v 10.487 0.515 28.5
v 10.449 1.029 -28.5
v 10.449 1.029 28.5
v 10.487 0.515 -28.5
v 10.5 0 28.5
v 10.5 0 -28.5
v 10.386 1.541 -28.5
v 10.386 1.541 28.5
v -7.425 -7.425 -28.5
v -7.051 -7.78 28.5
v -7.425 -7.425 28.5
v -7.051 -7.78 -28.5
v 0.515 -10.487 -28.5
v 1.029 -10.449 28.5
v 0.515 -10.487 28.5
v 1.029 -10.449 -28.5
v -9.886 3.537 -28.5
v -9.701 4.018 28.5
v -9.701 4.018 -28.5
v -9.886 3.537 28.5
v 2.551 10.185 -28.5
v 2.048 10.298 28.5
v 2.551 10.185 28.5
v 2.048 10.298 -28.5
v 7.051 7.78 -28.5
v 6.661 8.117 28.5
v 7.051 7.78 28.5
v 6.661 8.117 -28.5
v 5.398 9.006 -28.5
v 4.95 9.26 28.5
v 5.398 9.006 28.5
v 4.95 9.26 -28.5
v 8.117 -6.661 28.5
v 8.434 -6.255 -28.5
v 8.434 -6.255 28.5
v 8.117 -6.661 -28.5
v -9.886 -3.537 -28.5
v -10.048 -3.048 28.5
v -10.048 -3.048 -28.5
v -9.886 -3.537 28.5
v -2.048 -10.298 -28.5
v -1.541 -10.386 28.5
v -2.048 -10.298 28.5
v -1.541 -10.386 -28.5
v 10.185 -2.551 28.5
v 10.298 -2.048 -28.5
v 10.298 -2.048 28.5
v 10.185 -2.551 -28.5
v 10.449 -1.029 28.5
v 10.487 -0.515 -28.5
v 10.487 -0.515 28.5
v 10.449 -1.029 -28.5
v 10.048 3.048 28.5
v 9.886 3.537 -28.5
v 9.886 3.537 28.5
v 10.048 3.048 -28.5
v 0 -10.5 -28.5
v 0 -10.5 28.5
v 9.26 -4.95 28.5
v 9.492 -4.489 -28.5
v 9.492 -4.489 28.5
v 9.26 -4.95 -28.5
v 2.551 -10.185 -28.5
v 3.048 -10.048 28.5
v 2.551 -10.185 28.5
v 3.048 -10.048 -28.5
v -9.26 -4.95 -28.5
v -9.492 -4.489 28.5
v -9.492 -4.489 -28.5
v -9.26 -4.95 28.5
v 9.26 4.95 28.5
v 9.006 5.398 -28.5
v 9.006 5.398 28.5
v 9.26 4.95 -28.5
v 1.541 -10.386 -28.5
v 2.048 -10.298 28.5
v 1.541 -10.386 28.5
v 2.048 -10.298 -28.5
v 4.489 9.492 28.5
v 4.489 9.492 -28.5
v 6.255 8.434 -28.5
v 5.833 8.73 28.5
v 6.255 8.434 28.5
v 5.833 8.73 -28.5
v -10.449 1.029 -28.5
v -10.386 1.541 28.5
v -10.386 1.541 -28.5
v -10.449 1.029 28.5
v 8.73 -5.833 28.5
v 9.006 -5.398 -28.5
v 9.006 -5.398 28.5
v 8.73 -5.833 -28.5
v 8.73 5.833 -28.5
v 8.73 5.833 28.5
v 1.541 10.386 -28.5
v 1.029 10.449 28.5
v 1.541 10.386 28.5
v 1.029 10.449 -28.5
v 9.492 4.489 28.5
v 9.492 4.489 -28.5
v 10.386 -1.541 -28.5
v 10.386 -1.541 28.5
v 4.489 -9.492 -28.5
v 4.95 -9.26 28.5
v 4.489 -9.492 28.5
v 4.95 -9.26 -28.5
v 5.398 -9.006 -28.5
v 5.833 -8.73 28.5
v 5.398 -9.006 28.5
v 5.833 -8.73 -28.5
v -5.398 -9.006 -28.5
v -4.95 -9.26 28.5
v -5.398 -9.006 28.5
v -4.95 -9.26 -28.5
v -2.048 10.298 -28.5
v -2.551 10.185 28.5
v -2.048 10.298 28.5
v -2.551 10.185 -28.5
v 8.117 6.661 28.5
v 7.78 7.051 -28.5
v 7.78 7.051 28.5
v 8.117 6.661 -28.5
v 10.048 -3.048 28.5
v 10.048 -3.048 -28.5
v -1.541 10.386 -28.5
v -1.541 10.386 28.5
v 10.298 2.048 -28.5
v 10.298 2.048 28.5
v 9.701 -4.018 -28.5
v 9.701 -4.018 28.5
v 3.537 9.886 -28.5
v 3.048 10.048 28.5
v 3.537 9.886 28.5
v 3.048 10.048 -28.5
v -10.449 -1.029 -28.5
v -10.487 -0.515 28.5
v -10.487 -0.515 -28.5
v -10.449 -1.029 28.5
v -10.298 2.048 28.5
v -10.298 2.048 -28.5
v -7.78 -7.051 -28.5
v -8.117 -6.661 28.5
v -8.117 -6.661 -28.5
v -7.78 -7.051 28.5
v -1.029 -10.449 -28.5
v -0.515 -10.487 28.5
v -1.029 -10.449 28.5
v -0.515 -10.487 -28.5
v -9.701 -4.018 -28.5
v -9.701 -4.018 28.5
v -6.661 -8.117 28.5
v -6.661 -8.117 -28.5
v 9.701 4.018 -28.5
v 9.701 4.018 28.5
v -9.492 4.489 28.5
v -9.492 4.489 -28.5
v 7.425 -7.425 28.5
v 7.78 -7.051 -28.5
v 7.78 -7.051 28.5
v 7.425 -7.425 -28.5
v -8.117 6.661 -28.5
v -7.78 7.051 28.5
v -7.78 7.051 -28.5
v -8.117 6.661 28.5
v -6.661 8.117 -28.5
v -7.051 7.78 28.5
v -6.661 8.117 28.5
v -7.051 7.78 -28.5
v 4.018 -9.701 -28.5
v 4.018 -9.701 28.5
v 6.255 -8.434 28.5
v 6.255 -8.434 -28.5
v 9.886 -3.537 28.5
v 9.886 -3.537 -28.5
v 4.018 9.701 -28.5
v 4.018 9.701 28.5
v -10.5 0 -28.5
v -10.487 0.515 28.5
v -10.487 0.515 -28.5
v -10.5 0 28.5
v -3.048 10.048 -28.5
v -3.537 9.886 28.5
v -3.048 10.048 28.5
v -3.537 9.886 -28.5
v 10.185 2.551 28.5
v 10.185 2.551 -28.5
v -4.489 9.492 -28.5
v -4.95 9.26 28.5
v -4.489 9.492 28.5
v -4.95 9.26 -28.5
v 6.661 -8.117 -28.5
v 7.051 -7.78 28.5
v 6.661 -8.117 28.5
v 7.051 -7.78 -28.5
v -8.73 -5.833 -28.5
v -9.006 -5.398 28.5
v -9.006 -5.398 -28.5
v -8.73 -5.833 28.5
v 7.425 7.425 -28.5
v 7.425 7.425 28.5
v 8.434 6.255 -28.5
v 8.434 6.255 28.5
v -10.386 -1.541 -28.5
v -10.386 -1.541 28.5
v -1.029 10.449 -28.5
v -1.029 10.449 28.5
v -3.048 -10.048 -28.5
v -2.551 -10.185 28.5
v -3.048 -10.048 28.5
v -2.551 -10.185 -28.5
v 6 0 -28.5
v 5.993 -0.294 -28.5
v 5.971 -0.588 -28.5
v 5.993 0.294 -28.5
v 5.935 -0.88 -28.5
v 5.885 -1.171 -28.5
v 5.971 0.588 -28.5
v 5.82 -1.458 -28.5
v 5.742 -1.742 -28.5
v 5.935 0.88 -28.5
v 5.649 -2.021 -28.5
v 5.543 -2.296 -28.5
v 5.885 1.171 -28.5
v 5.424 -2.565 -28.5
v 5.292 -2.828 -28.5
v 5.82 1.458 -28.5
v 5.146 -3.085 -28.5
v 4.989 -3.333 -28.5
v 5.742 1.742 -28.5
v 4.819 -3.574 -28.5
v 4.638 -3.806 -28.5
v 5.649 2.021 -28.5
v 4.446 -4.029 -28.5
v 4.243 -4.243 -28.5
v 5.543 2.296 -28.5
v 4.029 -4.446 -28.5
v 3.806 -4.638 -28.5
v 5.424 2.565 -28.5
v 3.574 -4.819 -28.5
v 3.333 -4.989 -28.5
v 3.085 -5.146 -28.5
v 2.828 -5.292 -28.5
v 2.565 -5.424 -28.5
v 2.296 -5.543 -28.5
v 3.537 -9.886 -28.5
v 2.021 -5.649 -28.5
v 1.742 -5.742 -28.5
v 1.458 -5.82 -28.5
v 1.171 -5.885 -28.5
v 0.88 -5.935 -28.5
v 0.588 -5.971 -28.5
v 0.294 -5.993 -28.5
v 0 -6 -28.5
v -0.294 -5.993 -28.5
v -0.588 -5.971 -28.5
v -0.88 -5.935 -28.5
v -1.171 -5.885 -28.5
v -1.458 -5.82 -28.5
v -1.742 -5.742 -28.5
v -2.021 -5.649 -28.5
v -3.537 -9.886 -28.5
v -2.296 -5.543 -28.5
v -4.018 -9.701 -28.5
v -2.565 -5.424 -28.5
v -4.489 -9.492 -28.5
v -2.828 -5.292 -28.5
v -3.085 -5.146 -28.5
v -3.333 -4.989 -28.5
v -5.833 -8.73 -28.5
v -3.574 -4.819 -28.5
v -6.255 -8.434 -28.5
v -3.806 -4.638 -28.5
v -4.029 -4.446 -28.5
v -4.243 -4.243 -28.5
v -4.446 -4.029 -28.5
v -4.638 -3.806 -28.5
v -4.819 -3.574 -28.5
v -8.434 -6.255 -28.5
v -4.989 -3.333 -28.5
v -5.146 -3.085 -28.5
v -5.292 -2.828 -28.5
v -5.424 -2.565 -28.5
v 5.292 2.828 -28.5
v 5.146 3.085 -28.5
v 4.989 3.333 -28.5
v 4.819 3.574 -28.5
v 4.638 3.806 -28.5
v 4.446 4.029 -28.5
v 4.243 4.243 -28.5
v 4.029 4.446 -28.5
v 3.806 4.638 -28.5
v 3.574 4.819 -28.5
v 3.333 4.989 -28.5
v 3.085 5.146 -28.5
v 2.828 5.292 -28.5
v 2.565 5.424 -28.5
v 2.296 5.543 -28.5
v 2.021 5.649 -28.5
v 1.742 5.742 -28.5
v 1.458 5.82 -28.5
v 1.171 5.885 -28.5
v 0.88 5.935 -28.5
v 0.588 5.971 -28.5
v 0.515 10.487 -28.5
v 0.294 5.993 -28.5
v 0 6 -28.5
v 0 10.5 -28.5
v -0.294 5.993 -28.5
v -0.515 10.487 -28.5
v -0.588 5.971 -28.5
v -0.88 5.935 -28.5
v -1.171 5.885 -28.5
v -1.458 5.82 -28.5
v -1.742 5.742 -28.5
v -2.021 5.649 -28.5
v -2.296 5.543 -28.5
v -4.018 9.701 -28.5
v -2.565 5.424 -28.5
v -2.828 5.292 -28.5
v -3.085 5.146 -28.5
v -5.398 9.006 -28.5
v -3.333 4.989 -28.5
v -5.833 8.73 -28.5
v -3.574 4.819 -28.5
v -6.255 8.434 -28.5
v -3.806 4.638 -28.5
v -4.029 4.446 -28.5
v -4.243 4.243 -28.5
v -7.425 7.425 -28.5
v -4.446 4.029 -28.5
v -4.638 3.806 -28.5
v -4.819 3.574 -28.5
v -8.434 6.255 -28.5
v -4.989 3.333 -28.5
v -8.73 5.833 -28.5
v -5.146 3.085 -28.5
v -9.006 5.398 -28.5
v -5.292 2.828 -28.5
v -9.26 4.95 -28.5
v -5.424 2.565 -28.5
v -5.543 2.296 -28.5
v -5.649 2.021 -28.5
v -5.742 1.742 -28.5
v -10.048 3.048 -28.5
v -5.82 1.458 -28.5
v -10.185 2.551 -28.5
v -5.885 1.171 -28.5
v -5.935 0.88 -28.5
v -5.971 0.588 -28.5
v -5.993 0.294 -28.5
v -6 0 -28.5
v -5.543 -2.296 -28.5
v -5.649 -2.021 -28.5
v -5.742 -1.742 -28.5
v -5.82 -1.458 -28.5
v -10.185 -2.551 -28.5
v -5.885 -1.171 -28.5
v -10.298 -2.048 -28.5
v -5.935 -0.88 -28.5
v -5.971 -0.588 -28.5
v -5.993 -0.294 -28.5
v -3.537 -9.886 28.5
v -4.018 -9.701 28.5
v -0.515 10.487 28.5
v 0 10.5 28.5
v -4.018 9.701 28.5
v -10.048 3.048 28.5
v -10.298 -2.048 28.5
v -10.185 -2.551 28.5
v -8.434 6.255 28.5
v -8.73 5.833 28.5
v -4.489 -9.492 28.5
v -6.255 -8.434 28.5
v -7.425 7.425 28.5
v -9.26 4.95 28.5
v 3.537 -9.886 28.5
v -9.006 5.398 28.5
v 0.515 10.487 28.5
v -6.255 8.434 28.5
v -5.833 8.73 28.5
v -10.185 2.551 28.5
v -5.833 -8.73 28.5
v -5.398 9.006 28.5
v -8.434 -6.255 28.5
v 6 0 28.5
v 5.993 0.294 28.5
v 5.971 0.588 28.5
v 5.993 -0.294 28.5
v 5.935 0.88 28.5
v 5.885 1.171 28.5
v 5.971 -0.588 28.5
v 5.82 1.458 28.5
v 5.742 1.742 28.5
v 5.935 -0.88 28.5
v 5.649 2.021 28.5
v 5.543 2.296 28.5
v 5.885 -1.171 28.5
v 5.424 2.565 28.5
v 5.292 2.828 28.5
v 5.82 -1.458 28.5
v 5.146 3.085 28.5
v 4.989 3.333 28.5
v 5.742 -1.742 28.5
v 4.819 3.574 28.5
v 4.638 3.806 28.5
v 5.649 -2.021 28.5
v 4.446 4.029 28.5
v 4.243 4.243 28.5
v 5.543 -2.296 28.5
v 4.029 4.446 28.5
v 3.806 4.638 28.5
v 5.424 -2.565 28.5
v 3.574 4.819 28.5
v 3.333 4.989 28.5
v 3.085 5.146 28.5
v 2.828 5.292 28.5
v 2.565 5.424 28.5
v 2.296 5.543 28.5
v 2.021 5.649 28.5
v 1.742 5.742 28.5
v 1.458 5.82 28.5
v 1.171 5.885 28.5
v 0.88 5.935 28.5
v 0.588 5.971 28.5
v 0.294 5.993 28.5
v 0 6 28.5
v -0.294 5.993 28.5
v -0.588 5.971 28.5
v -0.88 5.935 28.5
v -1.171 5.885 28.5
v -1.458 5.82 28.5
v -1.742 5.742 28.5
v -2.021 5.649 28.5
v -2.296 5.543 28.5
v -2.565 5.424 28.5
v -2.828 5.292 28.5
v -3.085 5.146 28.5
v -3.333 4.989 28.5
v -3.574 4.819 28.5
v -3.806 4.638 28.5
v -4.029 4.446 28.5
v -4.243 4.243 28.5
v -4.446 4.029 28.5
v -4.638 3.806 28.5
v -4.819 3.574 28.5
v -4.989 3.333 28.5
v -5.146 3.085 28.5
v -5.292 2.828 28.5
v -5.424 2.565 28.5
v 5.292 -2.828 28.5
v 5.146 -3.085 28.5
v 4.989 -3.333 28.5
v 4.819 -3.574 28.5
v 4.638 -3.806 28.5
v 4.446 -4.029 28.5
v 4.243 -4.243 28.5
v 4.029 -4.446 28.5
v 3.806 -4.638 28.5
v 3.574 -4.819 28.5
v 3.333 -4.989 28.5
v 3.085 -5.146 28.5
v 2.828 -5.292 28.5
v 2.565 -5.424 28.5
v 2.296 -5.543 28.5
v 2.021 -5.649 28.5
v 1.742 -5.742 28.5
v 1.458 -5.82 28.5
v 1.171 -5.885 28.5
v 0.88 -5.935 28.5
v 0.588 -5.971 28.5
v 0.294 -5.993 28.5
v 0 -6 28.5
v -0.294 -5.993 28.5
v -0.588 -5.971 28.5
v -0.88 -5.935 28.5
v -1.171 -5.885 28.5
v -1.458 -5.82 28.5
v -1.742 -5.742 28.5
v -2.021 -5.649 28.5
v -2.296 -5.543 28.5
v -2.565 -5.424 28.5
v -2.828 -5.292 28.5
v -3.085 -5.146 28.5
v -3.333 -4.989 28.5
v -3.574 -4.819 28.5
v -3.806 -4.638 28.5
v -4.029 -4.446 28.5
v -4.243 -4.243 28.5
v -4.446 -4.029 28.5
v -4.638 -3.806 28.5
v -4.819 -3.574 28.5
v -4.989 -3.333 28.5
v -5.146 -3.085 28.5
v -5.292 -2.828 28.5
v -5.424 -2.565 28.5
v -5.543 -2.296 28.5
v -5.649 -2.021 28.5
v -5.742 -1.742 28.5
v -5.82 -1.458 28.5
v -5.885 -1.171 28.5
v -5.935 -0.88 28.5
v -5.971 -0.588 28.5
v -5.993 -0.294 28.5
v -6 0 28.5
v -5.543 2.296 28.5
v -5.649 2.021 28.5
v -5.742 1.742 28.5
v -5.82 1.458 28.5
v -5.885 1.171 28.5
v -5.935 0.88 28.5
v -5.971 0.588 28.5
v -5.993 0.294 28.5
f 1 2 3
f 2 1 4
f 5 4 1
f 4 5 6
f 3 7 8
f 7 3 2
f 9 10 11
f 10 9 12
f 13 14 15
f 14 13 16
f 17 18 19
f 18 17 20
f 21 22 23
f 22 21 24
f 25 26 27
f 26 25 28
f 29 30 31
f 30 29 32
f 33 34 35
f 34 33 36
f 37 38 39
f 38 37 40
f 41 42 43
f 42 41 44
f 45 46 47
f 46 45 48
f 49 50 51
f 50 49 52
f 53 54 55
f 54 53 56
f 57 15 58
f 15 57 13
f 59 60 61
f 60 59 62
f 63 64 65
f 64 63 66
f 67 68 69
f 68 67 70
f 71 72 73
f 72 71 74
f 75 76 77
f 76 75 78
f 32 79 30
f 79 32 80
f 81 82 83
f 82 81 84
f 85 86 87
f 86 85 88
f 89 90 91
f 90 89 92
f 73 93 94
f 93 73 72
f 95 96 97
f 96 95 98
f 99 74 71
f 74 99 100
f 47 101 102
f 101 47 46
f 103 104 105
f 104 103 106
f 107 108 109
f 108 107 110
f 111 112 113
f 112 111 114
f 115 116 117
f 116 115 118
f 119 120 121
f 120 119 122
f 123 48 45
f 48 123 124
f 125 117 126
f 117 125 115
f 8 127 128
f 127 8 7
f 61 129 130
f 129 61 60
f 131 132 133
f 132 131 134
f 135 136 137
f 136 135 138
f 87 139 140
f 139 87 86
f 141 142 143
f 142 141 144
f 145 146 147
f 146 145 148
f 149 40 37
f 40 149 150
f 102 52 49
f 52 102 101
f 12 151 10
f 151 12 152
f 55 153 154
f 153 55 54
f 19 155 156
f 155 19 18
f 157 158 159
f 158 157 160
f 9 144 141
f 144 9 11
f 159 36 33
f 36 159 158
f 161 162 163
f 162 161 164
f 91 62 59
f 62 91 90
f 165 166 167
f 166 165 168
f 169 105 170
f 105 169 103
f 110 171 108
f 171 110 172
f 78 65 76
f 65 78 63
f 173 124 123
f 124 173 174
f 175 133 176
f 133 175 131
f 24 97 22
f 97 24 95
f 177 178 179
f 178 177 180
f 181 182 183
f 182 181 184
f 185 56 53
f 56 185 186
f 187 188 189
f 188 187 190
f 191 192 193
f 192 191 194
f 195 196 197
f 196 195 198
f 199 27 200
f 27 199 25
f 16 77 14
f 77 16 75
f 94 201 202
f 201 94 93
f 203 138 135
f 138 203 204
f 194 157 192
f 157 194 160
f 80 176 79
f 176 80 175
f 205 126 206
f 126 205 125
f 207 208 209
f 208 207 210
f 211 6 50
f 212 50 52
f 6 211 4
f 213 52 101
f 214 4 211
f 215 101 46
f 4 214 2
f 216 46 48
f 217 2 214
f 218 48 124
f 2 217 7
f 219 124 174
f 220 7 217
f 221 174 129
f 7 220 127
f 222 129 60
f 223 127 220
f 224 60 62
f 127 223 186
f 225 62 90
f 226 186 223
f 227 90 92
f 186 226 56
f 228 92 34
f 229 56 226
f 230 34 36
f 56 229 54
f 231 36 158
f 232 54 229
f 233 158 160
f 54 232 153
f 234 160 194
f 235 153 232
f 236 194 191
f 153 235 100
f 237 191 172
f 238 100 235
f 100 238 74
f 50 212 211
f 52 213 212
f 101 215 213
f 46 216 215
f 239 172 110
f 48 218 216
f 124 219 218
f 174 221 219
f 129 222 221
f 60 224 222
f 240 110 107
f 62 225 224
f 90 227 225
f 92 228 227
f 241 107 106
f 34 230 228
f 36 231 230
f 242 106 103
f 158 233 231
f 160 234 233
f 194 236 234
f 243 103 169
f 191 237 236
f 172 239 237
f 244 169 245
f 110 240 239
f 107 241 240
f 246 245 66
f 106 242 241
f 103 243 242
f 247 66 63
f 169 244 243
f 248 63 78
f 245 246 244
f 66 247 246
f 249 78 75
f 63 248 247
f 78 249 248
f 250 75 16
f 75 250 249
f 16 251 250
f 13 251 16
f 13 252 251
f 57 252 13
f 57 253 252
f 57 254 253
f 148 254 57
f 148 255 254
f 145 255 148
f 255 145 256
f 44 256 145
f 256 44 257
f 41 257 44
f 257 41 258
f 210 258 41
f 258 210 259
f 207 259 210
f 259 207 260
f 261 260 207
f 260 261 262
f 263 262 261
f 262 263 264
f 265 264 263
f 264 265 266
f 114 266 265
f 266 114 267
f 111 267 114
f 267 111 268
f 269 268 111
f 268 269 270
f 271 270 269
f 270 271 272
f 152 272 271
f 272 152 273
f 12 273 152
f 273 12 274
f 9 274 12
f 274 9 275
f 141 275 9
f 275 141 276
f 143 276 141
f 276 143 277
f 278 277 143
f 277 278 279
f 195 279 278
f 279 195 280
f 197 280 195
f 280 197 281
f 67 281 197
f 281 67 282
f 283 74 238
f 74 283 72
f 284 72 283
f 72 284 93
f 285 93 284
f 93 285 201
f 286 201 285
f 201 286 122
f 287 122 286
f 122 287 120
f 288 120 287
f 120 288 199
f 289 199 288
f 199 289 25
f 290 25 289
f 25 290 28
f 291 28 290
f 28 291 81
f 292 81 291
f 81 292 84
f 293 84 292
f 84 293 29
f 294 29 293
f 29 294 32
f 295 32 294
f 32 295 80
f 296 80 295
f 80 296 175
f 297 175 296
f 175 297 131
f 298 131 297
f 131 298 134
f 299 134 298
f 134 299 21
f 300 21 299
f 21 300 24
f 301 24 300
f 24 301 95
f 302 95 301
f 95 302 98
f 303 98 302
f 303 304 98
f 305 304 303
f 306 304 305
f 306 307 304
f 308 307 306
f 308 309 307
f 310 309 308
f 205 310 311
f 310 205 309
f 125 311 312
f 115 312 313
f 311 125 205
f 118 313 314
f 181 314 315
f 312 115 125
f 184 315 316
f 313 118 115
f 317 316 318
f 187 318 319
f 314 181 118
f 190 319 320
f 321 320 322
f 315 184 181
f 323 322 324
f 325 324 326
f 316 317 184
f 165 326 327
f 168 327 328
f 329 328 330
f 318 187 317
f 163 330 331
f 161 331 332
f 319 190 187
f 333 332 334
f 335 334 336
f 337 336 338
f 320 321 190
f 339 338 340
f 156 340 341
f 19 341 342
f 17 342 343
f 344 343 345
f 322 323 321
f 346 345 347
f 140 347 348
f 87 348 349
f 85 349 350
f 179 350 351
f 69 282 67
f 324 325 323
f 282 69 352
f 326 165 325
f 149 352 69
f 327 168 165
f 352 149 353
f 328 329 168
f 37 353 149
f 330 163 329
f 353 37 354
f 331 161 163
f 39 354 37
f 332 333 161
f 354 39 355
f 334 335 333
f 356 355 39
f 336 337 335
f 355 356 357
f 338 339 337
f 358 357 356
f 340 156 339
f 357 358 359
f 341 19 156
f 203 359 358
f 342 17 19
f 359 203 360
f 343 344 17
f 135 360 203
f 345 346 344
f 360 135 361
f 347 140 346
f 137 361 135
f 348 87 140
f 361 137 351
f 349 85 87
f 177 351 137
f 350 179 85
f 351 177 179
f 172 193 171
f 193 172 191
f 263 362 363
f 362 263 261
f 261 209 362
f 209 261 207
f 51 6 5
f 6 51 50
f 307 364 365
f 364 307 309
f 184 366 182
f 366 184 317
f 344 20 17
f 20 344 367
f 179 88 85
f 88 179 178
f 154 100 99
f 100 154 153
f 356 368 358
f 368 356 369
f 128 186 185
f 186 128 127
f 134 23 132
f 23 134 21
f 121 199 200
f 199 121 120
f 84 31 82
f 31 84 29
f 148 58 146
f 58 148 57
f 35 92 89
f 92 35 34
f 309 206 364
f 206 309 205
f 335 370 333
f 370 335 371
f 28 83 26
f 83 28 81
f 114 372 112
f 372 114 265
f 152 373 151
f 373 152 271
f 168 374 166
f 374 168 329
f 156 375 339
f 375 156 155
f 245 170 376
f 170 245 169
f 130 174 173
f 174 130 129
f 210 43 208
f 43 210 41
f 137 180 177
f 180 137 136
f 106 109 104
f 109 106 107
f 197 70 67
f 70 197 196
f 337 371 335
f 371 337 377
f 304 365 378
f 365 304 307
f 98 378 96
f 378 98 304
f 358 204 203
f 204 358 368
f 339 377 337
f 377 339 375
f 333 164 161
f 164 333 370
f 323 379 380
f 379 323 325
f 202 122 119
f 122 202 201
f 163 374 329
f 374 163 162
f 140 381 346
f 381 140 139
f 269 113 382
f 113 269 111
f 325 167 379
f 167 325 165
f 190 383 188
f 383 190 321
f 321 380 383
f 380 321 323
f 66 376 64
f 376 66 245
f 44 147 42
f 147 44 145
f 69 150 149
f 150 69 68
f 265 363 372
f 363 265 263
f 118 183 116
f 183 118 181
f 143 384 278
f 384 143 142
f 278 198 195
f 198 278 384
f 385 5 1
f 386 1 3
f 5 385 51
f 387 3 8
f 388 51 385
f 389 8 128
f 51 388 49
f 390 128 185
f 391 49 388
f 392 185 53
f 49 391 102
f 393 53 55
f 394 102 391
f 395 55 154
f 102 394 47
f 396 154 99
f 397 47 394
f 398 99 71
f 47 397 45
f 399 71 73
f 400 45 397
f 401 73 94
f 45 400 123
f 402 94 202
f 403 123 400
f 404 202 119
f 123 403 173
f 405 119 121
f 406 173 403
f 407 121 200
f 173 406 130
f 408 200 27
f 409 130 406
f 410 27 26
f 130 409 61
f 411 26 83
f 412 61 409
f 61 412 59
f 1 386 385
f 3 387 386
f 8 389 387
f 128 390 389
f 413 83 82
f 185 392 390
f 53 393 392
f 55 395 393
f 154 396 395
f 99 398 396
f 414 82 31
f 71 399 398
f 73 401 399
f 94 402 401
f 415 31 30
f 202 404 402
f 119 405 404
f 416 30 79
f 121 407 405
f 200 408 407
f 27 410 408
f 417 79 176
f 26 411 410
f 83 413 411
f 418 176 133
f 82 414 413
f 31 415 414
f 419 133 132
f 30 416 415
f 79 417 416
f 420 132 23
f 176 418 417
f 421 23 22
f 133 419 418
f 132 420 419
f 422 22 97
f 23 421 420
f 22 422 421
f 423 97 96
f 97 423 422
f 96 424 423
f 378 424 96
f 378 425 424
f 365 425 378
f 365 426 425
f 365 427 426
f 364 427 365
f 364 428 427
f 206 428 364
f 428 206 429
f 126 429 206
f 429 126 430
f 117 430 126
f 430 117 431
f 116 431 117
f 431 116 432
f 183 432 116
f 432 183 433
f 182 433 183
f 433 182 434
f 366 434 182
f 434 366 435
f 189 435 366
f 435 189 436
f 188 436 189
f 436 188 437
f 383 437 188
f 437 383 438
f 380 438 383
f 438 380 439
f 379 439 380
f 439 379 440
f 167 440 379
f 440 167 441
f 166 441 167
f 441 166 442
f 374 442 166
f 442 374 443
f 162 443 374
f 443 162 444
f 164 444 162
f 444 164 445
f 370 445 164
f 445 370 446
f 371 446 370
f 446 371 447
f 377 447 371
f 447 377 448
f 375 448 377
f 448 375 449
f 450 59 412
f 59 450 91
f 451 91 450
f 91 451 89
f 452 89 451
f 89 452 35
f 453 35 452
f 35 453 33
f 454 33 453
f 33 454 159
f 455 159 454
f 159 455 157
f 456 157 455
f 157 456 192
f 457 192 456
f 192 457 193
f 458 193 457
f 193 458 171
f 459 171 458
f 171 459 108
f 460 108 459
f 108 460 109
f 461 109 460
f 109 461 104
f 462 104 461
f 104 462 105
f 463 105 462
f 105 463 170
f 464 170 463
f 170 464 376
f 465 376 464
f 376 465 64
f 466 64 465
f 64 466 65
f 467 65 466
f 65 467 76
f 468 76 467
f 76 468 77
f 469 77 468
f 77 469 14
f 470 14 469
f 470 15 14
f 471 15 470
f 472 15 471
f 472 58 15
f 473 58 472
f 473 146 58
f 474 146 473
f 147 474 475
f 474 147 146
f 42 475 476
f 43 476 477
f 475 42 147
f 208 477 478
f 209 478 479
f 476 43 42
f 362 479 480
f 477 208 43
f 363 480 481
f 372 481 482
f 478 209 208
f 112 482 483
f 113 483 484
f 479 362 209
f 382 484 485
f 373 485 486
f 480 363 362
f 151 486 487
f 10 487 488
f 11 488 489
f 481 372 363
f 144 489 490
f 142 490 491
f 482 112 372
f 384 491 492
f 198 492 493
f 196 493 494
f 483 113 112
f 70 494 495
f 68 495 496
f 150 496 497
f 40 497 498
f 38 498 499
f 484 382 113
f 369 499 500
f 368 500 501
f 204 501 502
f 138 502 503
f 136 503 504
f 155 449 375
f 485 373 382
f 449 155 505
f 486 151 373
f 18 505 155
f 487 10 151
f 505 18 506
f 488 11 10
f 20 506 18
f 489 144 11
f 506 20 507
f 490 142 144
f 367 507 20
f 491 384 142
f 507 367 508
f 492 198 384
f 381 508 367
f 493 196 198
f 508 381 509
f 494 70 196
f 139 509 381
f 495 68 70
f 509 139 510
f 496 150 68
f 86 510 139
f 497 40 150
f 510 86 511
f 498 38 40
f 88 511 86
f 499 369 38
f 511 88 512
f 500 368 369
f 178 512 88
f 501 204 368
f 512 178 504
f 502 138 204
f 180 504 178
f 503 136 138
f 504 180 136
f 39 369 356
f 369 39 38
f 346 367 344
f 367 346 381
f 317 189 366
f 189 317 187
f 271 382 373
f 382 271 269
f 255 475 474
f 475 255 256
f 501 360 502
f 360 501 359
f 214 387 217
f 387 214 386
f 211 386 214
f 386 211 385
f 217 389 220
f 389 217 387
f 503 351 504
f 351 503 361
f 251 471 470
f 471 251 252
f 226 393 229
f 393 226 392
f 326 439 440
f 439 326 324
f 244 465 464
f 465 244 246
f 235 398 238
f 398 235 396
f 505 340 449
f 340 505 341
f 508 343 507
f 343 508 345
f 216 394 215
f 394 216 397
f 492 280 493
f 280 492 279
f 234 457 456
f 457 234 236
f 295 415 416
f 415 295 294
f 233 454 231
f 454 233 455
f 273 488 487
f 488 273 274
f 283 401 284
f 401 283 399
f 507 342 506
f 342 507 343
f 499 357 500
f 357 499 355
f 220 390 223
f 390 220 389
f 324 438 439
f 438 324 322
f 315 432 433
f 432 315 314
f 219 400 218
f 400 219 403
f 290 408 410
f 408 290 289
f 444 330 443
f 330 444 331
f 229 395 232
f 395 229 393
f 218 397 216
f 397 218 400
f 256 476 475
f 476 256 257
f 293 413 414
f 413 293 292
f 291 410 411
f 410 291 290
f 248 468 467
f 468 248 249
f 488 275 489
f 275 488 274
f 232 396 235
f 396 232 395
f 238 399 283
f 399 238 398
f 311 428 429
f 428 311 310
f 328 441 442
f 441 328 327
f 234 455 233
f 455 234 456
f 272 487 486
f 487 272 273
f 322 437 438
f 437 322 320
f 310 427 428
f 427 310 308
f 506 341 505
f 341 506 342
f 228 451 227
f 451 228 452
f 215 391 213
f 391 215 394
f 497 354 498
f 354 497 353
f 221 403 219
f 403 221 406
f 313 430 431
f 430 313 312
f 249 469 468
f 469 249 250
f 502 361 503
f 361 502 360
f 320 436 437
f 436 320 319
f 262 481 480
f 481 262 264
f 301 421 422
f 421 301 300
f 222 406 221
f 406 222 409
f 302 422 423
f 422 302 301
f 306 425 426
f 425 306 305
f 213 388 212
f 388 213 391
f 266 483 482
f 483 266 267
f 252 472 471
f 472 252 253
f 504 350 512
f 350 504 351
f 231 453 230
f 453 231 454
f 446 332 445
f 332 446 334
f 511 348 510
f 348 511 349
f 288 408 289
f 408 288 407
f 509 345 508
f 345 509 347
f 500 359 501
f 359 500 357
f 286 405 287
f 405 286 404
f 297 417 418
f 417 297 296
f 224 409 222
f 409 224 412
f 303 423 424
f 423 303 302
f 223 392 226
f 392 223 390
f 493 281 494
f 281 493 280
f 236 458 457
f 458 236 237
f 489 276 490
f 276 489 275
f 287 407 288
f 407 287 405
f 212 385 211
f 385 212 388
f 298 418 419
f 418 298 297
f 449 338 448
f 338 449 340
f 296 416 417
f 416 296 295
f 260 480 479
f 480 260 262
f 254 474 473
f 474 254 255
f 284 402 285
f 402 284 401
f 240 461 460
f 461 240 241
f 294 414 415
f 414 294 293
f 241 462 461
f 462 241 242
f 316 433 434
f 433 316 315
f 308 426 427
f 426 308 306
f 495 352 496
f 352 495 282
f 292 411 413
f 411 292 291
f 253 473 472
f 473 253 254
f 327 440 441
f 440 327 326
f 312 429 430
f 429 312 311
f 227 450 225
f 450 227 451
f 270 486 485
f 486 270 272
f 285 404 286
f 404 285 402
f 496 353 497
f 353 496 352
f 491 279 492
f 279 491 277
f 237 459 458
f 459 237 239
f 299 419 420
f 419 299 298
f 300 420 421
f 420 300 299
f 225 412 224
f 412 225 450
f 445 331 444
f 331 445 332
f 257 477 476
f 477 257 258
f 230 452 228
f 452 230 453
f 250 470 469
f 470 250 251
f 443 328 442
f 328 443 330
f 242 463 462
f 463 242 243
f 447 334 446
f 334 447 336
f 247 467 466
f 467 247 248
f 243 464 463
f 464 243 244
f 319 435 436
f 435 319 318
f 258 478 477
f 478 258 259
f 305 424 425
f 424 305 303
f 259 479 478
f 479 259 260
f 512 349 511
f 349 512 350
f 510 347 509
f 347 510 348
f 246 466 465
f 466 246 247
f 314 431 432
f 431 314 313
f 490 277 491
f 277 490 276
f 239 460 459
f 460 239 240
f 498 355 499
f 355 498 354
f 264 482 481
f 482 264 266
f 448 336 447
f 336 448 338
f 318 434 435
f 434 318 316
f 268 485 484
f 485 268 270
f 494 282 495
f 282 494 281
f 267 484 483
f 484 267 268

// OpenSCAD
// Long linear bearing (simple hollow cylinder)
// Target: 12.0mm bore, 21.0mm outer diameter, 57.0mm length

bore_diameter_mm  = 12.0;
outer_diameter_mm = 21.0;
length_mm         = 57.0;

overlap_mm = 0.5; // ensures clean through-bore cut

$fn = 128;

module linear_bearing_simple() {
    difference() {
        // Outer body
        cylinder(h=length_mm, r=outer_diameter_mm/2, center=true);

        // Through-bore
        cylinder(h=length_mm + 2*overlap_mm, r=bore_diameter_mm/2, center=true);
    }
}

linear_bearing_simple();
